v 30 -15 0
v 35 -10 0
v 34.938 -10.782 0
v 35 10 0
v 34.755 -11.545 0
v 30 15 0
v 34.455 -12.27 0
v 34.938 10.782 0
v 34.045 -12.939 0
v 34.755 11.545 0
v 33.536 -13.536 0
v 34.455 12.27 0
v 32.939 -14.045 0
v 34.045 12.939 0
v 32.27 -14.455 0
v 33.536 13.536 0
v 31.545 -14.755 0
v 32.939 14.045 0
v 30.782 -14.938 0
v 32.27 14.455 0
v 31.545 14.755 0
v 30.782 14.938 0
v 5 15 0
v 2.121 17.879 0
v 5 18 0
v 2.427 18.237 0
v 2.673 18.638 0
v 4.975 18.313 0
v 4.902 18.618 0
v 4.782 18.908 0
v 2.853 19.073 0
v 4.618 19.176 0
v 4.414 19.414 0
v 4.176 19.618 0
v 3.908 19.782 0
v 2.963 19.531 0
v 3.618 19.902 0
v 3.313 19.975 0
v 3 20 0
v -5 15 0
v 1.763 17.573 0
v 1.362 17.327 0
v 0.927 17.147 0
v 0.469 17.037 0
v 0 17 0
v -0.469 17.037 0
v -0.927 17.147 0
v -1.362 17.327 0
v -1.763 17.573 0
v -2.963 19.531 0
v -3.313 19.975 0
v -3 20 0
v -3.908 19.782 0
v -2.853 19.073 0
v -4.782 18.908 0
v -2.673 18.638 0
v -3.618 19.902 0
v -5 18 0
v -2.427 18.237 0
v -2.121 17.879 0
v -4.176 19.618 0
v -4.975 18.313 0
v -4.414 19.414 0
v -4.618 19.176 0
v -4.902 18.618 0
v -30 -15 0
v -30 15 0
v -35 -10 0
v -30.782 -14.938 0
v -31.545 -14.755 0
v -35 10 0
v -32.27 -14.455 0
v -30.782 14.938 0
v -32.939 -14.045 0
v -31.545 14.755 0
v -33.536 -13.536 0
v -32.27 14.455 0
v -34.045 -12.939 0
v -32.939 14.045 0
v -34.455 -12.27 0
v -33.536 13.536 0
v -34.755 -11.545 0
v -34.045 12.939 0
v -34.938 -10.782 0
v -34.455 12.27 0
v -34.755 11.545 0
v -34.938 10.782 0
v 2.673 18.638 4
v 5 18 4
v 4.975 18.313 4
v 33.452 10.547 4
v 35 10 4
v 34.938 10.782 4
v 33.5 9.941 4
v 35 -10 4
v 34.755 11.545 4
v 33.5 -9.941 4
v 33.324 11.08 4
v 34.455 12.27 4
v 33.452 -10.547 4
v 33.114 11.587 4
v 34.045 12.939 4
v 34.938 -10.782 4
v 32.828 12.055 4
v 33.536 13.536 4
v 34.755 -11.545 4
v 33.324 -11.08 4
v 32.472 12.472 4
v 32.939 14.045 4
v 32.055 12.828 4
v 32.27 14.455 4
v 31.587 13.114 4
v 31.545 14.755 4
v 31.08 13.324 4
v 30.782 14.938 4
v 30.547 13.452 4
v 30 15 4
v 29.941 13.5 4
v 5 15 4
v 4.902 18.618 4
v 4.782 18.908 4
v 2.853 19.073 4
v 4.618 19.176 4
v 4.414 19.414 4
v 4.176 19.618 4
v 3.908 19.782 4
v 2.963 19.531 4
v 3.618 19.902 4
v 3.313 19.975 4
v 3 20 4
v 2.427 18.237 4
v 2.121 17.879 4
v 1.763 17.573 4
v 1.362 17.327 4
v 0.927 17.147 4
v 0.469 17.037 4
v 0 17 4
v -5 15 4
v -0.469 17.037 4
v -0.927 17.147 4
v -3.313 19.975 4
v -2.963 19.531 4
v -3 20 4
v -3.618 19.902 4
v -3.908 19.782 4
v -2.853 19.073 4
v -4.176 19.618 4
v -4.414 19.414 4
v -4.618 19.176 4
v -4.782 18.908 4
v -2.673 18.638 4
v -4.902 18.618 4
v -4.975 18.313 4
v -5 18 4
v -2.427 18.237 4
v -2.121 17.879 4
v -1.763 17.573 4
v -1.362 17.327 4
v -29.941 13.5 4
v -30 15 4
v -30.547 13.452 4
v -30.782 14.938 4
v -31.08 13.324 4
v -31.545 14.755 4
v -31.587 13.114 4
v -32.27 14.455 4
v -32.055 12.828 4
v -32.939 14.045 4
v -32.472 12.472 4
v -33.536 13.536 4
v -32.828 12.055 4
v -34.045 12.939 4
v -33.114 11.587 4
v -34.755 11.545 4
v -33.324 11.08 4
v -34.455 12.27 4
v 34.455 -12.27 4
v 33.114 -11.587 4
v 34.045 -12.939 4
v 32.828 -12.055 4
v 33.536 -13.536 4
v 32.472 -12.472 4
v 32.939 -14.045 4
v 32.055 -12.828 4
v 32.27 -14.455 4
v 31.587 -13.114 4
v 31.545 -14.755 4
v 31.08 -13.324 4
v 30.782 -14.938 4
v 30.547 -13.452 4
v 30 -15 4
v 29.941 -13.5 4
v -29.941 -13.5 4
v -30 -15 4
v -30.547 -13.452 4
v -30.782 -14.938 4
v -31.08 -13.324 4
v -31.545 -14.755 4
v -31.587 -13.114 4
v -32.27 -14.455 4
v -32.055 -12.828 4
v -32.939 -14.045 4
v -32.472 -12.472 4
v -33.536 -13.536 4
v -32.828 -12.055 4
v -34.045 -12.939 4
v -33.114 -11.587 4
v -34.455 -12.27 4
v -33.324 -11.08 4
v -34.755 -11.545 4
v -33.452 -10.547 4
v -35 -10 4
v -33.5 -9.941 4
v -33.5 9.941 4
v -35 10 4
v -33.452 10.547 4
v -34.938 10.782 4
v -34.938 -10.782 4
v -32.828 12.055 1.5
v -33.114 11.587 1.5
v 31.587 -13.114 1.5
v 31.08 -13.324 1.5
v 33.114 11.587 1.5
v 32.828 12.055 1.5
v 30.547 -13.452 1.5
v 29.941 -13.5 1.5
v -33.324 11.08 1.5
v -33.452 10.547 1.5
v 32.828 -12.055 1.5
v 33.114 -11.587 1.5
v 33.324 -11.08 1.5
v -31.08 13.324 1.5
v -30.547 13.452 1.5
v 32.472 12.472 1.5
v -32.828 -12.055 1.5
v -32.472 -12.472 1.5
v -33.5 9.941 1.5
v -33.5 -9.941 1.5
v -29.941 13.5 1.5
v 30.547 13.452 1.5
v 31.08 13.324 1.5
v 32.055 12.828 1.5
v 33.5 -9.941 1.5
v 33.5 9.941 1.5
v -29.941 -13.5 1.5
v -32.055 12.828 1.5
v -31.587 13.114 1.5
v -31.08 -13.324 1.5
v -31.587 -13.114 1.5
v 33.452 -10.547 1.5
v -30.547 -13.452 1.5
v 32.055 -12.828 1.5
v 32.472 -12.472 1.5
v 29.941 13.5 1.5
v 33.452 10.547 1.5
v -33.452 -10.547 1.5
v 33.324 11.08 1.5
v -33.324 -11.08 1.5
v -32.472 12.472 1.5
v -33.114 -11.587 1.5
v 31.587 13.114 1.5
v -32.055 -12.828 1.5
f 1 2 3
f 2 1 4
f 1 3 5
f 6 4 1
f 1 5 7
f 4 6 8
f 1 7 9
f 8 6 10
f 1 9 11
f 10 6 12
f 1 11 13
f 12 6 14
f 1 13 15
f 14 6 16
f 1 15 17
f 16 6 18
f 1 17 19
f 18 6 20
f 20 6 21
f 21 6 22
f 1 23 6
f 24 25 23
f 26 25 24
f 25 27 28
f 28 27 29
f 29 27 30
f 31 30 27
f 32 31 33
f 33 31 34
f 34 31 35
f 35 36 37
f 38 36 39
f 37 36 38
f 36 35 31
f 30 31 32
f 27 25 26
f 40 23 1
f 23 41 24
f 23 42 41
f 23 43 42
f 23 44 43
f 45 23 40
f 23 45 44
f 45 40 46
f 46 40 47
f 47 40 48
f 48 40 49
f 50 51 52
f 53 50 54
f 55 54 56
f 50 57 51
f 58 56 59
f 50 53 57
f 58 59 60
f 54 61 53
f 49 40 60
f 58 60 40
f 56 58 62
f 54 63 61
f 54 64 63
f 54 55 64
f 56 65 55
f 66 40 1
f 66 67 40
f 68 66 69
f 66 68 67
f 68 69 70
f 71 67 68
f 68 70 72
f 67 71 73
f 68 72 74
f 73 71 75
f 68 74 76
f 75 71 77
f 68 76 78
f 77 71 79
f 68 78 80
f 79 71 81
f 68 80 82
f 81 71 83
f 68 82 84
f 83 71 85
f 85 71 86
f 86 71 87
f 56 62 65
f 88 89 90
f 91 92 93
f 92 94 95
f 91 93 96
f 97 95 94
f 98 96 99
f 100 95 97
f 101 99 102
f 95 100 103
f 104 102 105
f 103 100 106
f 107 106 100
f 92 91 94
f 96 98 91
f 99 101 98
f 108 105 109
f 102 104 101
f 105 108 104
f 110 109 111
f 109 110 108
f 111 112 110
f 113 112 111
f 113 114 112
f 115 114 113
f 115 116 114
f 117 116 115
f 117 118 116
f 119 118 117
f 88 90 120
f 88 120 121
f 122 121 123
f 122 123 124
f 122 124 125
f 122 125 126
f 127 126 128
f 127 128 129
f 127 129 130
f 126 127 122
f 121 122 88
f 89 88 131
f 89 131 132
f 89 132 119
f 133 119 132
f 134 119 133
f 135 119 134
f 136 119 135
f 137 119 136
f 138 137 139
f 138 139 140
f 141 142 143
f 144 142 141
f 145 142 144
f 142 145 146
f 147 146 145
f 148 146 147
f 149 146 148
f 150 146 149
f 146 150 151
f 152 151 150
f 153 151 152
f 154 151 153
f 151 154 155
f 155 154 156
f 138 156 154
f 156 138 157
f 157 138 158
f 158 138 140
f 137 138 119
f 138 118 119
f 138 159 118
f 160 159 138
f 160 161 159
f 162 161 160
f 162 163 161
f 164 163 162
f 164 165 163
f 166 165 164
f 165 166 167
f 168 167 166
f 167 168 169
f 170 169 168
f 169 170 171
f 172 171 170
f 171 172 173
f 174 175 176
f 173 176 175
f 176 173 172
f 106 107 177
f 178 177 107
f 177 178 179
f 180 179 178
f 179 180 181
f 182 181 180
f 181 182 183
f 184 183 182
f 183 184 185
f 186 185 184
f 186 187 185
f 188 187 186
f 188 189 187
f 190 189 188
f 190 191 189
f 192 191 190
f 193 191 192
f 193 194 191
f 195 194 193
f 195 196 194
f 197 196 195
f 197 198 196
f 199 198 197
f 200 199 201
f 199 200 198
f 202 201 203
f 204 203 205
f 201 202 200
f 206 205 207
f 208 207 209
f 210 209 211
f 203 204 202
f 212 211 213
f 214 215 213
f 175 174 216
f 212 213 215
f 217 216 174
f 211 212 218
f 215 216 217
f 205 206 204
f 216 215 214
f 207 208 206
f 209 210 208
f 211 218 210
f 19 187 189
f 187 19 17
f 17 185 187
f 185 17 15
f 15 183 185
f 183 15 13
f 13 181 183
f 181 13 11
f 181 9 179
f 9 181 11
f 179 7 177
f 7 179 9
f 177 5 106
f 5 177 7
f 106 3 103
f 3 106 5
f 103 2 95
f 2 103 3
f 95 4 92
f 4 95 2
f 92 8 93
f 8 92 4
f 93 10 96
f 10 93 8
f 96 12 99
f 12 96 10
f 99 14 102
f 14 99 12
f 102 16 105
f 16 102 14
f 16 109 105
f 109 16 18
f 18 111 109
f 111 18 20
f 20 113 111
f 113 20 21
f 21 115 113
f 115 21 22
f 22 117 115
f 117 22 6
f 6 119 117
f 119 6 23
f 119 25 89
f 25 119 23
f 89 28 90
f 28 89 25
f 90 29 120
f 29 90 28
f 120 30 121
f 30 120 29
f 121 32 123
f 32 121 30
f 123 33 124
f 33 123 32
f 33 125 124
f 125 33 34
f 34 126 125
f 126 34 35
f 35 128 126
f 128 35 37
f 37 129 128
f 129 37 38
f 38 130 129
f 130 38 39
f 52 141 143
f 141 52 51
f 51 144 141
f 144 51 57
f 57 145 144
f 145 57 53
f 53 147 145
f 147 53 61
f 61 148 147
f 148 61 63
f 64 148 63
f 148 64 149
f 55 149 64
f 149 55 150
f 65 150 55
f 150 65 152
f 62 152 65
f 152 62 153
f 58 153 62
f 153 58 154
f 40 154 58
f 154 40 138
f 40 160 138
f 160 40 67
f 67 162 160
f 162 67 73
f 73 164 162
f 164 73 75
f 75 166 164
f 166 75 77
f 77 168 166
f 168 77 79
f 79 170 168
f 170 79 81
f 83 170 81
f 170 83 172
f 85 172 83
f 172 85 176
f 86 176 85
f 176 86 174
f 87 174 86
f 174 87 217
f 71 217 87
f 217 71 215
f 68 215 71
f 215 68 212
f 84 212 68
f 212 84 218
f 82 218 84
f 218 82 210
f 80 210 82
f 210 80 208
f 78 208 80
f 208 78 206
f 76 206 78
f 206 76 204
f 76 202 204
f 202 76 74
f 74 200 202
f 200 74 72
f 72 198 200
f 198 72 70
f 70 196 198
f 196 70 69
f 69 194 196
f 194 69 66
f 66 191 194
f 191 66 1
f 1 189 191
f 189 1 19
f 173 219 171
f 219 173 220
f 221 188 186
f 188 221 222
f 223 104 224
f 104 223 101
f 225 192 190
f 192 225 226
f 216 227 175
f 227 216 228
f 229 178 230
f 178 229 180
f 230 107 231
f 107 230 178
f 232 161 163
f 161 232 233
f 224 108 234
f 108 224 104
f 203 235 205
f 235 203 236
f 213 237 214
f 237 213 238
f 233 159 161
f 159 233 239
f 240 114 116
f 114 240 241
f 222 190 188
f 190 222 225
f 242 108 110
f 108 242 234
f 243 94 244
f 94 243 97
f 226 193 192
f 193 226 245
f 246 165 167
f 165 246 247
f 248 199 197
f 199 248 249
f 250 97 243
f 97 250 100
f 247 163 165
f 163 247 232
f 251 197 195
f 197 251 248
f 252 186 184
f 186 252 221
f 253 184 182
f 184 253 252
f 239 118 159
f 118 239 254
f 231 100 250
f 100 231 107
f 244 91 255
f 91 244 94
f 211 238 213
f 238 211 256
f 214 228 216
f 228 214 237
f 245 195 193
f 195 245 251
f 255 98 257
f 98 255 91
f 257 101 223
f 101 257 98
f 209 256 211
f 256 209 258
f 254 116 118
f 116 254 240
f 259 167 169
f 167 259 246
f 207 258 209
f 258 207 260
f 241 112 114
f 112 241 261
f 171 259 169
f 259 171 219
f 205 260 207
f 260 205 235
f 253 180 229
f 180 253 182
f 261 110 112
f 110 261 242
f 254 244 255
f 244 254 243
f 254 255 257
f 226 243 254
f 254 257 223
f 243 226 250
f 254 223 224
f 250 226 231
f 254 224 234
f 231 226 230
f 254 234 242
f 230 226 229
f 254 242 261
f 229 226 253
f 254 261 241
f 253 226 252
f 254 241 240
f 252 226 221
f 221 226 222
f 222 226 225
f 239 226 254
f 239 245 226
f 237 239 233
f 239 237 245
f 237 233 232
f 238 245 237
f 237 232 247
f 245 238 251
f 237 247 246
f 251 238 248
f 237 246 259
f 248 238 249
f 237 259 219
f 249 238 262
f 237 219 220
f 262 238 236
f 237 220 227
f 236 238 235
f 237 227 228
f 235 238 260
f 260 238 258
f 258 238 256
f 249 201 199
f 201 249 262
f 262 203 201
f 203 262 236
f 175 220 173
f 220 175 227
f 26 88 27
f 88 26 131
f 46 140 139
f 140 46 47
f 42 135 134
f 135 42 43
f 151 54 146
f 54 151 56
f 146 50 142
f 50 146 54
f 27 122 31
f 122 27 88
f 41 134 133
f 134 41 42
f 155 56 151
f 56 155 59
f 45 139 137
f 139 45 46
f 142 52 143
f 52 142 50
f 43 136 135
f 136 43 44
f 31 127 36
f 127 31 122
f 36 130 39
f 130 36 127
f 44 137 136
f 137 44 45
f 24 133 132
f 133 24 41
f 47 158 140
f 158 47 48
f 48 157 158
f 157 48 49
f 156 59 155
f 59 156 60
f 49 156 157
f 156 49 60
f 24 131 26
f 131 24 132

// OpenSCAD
// Rectangle Name Keychain
// Rectangular keychain with name text

// --- Parameters ---
Name          = "Maria";
Font          = "Bebas Neue";
Name_Size     = 40;
Rect_Width    = 70;
Rect_Height   = 30;
Corner_Radius = 5;
Thickness     = 4;
Ring_Hole_D   = 6;
Border        = 1.5;

$fn = 40;

module name_shape(txt, fnt) {
  resize([Name_Size, 0, 0], auto=true)
  text(txt, size=16, font=fnt, halign="center", valign="center");
}

module rect_2d(w, h, r) {
  offset(r=r) offset(-r)
  square([w, h], center=true);
}

module ring_stem() {
  hull() {
    translate([0, Rect_Height / 2])
    rect_2d(Ring_Hole_D + 4, Ring_Hole_D + 4, 2);
    translate([0, Rect_Height / 2 - 4])
    square([Ring_Hole_D + 4, 1], center=true);
  }
}

module keychain_2d() {
  union() {
    rect_2d(Rect_Width, Rect_Height, Corner_Radius);
    ring_stem();
  }
}

difference() {
  linear_extrude(Thickness)
  keychain_2d();

  // Border cutout
  translate([0, 0, Border])
  linear_extrude(Thickness)
  offset(delta=-Border)
  rect_2d(Rect_Width, Rect_Height, Corner_Radius);

  // Ring hole
  translate([0, Rect_Height / 2 + Ring_Hole_D / 2 + 2, -0.5])
  linear_extrude(Thickness + 1)
  circle(d=Ring_Hole_D);

  // Name text (engrave)
  translate([0, 0, Thickness - 1.5])
  linear_extrude(2)
  name_shape(Name, str(Font, ":style=Bold"));
}
